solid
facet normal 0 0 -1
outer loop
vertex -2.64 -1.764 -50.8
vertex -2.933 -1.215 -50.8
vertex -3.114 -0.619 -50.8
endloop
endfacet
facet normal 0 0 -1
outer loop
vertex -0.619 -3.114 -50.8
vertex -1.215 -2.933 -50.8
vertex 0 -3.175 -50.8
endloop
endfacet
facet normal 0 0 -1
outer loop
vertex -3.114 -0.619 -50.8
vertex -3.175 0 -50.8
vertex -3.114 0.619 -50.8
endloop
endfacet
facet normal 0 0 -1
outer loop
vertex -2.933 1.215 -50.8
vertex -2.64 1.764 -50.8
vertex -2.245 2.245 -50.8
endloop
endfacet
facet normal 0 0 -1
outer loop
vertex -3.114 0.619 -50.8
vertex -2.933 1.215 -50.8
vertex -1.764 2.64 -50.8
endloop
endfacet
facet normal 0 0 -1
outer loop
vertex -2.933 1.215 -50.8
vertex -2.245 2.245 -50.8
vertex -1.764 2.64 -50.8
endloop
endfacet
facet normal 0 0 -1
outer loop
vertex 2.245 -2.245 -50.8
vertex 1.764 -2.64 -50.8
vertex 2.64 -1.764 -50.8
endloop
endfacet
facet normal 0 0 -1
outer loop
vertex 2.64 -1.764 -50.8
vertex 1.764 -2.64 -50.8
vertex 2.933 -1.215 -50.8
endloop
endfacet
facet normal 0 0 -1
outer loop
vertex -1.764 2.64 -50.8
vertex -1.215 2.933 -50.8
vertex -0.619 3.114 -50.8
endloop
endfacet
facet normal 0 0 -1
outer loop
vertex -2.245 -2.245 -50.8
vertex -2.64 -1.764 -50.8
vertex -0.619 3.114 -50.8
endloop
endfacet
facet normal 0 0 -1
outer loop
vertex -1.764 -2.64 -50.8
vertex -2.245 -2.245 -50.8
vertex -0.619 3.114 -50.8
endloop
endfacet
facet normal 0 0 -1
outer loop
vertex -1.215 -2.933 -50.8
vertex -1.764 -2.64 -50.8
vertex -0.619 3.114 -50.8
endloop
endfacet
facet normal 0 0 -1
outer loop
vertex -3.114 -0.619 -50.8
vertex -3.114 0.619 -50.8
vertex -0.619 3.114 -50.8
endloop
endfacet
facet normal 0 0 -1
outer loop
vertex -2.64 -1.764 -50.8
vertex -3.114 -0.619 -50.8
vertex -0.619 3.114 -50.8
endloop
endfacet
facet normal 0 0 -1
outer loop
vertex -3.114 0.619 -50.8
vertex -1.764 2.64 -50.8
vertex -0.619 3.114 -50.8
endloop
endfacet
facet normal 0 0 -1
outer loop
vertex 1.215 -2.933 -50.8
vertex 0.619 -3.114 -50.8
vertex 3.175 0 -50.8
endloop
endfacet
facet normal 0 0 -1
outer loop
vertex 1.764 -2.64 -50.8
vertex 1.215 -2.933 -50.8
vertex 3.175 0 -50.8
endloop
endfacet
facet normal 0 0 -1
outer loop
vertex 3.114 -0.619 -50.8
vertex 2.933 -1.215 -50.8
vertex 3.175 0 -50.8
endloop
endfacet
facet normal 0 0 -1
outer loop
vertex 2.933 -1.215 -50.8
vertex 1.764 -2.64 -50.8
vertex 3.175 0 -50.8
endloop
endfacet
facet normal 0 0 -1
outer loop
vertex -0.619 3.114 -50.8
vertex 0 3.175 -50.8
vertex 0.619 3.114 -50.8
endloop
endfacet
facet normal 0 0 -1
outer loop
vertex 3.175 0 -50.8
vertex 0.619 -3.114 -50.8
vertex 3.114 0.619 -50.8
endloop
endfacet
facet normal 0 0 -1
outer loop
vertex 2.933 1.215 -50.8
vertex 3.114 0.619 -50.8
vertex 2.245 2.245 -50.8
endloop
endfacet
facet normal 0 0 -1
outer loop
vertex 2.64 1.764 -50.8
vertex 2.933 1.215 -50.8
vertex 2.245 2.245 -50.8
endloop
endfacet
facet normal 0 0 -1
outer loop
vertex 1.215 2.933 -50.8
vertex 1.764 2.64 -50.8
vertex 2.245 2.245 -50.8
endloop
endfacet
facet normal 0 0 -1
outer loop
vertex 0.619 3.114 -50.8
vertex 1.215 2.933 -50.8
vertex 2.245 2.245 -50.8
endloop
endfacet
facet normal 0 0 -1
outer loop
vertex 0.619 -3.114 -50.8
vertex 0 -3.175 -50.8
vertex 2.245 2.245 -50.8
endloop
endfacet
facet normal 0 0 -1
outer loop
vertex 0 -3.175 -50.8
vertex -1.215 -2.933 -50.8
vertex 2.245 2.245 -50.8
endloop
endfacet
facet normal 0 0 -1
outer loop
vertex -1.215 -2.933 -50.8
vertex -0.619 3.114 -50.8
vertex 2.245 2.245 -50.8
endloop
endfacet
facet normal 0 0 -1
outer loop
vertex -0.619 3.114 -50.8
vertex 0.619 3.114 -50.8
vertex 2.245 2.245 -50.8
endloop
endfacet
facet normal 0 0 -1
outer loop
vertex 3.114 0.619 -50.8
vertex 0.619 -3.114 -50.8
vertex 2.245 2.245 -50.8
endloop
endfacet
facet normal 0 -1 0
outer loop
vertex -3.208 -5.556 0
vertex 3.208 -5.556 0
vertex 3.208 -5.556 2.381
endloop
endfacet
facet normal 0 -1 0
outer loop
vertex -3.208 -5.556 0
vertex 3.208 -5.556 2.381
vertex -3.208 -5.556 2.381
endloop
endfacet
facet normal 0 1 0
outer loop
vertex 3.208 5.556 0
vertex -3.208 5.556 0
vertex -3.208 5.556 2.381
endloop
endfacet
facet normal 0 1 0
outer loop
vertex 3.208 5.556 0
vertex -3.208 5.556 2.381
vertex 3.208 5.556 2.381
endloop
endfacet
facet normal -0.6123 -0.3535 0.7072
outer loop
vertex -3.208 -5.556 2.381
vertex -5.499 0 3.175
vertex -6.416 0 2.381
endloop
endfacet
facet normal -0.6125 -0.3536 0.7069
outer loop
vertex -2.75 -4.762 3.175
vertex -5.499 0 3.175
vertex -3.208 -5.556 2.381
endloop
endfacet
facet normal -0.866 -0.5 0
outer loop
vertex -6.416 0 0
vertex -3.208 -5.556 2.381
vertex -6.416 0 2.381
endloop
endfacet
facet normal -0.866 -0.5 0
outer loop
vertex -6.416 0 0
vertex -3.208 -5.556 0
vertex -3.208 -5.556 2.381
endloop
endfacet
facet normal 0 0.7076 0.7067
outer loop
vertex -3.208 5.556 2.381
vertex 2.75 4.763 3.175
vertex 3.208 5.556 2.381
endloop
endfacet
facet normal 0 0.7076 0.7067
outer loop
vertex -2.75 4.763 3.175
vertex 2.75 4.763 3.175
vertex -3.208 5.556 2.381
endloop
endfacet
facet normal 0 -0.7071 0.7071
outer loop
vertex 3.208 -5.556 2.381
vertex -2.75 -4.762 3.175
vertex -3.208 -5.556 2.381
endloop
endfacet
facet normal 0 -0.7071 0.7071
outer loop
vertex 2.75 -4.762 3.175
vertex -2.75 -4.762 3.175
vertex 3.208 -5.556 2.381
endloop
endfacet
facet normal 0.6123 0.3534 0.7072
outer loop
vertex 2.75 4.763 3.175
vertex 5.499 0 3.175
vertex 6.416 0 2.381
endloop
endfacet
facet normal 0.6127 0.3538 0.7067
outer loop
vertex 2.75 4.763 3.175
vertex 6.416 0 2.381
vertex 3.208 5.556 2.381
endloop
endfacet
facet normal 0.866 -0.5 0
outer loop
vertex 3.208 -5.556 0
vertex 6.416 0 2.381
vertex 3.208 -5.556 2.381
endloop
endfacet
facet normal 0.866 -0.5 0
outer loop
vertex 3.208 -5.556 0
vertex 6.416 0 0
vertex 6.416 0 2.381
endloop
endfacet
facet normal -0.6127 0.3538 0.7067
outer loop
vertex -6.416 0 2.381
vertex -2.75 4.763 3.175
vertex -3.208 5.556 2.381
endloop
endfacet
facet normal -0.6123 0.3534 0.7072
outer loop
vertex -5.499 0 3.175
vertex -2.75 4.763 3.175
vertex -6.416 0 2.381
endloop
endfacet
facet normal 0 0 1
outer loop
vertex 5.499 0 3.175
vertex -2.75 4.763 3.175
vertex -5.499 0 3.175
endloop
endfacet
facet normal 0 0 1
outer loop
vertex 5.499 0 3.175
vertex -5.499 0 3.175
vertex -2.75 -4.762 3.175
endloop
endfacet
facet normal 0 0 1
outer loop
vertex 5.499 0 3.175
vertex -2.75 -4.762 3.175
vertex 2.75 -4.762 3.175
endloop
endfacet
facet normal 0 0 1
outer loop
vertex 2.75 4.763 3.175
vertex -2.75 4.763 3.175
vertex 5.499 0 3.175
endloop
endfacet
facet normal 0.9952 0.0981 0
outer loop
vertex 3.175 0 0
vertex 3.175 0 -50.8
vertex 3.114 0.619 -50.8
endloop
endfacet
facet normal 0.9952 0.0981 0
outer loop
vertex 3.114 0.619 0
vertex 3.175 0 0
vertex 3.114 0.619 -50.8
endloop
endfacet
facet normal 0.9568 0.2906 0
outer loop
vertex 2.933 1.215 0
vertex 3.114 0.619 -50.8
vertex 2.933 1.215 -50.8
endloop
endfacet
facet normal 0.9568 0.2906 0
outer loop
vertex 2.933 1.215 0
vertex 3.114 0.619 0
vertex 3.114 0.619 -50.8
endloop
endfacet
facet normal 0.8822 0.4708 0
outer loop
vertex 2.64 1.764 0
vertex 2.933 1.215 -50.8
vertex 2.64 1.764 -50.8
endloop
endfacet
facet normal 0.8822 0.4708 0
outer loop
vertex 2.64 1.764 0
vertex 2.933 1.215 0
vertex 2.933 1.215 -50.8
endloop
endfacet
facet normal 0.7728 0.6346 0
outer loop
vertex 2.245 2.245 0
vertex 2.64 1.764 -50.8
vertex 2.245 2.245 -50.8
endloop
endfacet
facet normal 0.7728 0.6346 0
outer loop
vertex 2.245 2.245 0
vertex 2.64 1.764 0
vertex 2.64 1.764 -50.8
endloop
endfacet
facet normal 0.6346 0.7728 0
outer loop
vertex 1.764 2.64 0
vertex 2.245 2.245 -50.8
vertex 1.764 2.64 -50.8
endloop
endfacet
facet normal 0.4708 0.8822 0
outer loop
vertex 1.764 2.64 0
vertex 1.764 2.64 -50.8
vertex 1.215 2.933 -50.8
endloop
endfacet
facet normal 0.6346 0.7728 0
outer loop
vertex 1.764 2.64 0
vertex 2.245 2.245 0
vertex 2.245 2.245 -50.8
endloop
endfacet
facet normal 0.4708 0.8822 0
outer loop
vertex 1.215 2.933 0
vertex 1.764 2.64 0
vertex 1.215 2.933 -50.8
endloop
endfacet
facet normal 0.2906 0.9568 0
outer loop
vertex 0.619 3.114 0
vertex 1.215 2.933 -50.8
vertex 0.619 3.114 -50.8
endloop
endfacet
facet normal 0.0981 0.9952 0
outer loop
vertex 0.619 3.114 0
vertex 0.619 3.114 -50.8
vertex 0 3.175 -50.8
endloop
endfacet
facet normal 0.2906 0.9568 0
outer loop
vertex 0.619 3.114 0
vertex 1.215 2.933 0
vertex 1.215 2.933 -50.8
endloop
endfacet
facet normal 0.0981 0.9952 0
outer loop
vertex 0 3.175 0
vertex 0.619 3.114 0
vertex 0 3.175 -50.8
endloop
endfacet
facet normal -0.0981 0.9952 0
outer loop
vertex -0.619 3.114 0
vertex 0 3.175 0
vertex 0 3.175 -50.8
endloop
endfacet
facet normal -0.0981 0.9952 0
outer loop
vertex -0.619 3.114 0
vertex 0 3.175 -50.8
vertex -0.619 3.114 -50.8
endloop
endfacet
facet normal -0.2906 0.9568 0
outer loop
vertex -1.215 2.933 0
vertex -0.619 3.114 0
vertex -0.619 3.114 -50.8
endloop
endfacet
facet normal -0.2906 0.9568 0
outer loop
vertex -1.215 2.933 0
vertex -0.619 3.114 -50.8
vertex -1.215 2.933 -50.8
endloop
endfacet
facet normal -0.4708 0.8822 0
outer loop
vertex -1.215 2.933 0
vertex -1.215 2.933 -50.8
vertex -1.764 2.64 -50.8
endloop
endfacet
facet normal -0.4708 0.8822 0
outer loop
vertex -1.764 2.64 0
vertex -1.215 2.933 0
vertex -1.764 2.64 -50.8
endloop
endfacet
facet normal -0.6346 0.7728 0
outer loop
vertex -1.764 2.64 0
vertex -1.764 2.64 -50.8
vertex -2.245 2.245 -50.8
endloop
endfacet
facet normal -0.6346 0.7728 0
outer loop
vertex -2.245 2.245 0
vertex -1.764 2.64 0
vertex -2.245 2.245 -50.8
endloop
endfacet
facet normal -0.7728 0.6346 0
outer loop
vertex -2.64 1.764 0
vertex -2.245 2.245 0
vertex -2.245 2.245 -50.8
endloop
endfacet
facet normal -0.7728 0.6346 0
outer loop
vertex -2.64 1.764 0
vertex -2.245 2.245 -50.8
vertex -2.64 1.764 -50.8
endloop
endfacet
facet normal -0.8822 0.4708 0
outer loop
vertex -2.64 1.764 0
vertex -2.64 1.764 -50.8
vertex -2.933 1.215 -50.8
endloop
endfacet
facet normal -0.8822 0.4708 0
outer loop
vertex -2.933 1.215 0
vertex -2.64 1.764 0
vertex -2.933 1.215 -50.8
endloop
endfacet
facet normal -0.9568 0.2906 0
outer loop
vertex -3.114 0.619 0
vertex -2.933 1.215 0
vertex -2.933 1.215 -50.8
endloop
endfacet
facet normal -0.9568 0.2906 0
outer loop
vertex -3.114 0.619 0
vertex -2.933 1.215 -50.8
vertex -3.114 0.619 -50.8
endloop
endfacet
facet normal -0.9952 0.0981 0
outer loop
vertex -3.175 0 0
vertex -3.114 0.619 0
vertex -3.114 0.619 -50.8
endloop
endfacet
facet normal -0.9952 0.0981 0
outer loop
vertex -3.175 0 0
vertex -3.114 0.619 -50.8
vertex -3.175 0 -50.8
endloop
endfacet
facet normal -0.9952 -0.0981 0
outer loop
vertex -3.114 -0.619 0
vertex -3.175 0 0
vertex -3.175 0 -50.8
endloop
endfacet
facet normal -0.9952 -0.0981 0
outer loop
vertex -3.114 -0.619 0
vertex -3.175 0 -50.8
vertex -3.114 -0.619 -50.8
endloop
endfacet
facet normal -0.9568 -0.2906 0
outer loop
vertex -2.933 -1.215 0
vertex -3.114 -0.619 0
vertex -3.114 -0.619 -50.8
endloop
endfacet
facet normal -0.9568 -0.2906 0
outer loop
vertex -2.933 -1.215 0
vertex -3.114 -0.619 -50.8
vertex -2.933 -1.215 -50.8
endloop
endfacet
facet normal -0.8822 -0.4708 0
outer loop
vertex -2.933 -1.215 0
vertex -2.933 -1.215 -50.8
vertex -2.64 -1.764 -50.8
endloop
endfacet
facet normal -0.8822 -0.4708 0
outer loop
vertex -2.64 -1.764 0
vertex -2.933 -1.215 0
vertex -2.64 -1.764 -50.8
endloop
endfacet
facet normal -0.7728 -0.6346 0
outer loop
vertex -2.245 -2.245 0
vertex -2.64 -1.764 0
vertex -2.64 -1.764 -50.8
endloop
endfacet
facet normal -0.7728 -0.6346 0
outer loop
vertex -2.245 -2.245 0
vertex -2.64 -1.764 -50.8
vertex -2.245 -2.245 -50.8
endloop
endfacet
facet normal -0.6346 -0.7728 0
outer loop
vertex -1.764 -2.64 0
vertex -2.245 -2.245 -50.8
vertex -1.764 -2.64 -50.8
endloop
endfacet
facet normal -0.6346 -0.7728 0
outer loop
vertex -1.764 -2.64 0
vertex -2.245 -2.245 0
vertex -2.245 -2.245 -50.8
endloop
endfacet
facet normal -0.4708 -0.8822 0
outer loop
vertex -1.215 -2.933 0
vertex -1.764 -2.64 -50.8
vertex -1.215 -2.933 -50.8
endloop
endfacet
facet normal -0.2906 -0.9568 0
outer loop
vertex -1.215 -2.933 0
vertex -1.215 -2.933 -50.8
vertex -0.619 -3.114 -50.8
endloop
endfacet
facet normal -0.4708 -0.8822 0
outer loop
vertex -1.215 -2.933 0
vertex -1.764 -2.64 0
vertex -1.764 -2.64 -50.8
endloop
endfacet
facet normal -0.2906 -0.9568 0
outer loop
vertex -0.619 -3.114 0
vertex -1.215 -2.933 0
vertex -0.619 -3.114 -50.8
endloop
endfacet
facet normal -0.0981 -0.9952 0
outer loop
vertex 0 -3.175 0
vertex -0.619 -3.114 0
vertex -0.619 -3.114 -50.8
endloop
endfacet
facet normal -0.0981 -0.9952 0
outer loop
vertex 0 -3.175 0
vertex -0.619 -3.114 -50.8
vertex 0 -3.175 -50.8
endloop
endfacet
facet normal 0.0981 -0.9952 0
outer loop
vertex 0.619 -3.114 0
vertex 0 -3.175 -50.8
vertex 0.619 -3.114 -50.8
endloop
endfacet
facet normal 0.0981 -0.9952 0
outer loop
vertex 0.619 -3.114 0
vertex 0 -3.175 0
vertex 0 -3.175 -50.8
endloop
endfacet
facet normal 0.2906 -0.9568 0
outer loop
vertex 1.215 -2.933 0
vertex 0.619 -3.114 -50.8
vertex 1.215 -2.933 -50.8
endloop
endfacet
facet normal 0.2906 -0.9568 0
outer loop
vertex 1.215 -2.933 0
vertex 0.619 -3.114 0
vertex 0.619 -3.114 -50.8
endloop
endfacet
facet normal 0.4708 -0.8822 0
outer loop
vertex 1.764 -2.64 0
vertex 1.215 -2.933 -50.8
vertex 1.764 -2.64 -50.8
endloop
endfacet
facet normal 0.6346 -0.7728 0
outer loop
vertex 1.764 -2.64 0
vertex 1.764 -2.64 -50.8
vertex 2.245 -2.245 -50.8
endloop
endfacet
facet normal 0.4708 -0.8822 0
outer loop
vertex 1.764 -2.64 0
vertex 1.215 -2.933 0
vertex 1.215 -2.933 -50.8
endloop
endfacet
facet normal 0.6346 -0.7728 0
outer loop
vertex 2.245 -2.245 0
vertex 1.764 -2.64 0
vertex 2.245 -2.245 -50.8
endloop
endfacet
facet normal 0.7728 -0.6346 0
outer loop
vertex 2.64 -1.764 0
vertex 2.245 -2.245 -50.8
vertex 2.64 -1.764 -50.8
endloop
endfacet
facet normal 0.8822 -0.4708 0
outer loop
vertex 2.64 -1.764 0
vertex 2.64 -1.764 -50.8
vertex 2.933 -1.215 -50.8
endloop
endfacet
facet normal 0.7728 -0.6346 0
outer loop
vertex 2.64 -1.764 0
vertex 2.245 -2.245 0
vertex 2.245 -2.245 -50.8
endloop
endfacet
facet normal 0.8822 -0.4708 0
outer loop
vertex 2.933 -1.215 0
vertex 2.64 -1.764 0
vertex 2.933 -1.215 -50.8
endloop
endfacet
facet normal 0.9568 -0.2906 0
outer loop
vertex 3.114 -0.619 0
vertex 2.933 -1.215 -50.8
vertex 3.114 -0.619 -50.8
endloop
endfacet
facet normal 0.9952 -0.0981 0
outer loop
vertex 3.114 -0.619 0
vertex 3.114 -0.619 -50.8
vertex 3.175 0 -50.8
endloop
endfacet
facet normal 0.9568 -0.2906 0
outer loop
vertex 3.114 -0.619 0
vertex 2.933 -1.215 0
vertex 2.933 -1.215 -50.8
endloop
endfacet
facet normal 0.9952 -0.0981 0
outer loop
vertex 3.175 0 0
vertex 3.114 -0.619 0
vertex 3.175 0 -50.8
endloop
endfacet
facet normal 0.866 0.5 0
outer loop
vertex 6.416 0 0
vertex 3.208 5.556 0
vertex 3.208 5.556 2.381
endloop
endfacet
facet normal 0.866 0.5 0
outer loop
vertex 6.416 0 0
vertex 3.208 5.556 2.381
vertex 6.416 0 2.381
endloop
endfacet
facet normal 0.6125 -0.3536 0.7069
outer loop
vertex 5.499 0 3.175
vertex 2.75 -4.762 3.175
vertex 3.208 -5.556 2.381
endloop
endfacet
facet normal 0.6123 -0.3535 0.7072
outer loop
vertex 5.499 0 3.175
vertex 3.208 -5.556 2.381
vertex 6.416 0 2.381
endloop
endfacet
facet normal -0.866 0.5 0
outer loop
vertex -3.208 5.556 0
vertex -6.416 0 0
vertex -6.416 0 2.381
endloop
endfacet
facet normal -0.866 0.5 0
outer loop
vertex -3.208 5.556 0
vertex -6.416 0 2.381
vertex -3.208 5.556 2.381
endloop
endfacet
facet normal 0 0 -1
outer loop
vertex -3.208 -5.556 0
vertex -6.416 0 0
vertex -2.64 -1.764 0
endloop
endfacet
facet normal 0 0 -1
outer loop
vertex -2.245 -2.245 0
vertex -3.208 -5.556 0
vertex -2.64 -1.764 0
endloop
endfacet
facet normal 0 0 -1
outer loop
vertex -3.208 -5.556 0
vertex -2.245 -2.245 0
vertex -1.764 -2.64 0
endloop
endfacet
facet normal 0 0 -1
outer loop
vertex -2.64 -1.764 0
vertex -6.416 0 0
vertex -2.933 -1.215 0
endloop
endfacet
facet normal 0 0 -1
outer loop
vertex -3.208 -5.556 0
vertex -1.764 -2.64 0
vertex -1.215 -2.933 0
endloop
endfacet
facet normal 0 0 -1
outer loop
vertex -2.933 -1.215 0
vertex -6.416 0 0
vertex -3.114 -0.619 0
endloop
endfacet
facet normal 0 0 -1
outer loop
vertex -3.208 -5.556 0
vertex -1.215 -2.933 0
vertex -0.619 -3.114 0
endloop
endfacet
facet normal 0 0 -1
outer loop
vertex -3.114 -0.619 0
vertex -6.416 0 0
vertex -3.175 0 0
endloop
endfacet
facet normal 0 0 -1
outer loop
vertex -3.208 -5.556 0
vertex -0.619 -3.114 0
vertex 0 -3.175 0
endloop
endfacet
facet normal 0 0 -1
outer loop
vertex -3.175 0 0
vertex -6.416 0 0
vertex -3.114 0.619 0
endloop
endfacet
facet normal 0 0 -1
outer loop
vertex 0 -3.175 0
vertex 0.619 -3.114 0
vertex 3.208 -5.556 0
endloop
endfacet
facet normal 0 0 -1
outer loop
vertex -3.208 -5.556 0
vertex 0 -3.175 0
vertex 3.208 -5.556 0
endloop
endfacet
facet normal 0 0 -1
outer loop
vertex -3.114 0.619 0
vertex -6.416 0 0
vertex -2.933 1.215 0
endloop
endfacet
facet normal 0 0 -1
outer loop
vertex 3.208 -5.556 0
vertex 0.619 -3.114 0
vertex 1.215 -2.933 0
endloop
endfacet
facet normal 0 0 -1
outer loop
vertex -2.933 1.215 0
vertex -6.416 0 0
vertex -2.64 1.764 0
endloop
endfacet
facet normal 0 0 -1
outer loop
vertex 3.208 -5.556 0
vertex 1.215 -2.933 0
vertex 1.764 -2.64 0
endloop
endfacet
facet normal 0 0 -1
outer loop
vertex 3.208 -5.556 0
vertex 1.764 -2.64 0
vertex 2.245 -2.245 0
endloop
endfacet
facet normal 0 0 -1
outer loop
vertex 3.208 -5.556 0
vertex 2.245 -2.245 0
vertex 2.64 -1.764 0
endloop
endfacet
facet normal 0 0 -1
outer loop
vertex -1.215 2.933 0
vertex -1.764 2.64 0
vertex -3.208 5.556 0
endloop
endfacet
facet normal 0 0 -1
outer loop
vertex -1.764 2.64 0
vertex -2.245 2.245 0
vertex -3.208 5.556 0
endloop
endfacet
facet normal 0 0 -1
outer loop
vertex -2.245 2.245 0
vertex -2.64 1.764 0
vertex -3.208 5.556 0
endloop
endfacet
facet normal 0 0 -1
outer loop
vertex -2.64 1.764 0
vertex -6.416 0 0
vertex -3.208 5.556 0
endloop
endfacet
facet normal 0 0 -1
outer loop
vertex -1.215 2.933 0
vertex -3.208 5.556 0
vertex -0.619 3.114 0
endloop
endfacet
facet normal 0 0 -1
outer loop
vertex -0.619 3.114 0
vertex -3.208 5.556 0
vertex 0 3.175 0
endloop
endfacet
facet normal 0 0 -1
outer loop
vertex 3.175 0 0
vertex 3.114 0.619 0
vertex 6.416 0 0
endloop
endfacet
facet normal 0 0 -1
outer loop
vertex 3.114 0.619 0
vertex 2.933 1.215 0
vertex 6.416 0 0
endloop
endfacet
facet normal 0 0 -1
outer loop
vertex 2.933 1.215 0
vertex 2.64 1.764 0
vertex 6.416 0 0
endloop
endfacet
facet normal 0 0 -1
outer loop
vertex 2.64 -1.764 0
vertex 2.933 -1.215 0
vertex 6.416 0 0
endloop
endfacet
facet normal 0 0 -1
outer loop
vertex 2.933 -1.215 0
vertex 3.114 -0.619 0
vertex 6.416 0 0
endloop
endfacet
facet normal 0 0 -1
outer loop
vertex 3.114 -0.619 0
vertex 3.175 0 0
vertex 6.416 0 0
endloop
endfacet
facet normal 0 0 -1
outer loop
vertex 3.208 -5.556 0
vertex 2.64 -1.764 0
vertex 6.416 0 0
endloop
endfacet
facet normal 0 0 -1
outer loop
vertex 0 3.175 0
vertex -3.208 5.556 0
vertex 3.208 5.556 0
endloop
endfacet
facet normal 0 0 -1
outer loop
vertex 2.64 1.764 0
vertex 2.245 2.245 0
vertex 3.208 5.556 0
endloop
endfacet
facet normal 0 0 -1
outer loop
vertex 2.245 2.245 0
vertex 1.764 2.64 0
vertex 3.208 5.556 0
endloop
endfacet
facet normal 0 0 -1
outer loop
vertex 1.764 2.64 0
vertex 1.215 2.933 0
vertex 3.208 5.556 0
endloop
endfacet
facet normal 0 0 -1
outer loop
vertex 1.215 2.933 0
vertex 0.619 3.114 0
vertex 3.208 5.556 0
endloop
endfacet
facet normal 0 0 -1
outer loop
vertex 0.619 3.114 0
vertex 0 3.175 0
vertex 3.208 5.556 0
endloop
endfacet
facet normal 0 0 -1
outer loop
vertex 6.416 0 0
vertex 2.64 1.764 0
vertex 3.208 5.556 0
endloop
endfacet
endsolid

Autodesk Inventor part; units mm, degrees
ref_plane "YZ Plane" through (0, 0, 0) normal (1, 0, 0) x (0, 1, 0)
ref_plane "XZ Plane" through (0, 0, 0) normal (0, 1, 0) x (-1, 0, 0)
ref_plane "XY Plane" through (0, 0, 0) normal (0, 0, 1) x (1, 0, 0)
sketch "Sketch1" plane through (0, 0, 0) normal (0, 0, 1) x (1, 0, 0)
  circle A0 centre (0, 0) radius 3.175
  line L0 (3.2079, 5.5563) -> (6.4158, 0)
  line L1 (6.4158, 0) -> (3.2079, -5.5562)
  line L2 (3.2079, -5.5562) -> (-3.2079, -5.5562)
  line L3 (-3.2079, -5.5562) -> (-6.4158, 0)
  line L4 (-6.4158, 0) -> (-3.2079, 5.5563)
  line L5 (-3.2079, 5.5563) -> (3.2079, 5.5563)
  dimension "d0" = 6.35
  dimension "d1" = 11.1125
extrude "Extrusion1" add sketch "Sketch1" against normal blind 50.8 contours A0
extrude "Extrusion2" add sketch "Sketch1" along normal blind 3.175 contours A0 | L0 L1 L2 L3 L4 L5
thread "Thread1" size "1/4-20 UNC" class "2A" standard "ANSI Unified Screw Threads" full length
chamfer "Chamfer1" distance 0.7937 angle 45 6 edges at (4.8119, 2.7781, 3.175) (0, 5.5563, 3.175) (-4.8119, 2.7781, 3.175) (-4.8119, -2.7781, 3.175) (0, -5.5562, 3.175) (4.8119, -2.7781, 3.175)
properties part number "2_bolt_.25_20"
